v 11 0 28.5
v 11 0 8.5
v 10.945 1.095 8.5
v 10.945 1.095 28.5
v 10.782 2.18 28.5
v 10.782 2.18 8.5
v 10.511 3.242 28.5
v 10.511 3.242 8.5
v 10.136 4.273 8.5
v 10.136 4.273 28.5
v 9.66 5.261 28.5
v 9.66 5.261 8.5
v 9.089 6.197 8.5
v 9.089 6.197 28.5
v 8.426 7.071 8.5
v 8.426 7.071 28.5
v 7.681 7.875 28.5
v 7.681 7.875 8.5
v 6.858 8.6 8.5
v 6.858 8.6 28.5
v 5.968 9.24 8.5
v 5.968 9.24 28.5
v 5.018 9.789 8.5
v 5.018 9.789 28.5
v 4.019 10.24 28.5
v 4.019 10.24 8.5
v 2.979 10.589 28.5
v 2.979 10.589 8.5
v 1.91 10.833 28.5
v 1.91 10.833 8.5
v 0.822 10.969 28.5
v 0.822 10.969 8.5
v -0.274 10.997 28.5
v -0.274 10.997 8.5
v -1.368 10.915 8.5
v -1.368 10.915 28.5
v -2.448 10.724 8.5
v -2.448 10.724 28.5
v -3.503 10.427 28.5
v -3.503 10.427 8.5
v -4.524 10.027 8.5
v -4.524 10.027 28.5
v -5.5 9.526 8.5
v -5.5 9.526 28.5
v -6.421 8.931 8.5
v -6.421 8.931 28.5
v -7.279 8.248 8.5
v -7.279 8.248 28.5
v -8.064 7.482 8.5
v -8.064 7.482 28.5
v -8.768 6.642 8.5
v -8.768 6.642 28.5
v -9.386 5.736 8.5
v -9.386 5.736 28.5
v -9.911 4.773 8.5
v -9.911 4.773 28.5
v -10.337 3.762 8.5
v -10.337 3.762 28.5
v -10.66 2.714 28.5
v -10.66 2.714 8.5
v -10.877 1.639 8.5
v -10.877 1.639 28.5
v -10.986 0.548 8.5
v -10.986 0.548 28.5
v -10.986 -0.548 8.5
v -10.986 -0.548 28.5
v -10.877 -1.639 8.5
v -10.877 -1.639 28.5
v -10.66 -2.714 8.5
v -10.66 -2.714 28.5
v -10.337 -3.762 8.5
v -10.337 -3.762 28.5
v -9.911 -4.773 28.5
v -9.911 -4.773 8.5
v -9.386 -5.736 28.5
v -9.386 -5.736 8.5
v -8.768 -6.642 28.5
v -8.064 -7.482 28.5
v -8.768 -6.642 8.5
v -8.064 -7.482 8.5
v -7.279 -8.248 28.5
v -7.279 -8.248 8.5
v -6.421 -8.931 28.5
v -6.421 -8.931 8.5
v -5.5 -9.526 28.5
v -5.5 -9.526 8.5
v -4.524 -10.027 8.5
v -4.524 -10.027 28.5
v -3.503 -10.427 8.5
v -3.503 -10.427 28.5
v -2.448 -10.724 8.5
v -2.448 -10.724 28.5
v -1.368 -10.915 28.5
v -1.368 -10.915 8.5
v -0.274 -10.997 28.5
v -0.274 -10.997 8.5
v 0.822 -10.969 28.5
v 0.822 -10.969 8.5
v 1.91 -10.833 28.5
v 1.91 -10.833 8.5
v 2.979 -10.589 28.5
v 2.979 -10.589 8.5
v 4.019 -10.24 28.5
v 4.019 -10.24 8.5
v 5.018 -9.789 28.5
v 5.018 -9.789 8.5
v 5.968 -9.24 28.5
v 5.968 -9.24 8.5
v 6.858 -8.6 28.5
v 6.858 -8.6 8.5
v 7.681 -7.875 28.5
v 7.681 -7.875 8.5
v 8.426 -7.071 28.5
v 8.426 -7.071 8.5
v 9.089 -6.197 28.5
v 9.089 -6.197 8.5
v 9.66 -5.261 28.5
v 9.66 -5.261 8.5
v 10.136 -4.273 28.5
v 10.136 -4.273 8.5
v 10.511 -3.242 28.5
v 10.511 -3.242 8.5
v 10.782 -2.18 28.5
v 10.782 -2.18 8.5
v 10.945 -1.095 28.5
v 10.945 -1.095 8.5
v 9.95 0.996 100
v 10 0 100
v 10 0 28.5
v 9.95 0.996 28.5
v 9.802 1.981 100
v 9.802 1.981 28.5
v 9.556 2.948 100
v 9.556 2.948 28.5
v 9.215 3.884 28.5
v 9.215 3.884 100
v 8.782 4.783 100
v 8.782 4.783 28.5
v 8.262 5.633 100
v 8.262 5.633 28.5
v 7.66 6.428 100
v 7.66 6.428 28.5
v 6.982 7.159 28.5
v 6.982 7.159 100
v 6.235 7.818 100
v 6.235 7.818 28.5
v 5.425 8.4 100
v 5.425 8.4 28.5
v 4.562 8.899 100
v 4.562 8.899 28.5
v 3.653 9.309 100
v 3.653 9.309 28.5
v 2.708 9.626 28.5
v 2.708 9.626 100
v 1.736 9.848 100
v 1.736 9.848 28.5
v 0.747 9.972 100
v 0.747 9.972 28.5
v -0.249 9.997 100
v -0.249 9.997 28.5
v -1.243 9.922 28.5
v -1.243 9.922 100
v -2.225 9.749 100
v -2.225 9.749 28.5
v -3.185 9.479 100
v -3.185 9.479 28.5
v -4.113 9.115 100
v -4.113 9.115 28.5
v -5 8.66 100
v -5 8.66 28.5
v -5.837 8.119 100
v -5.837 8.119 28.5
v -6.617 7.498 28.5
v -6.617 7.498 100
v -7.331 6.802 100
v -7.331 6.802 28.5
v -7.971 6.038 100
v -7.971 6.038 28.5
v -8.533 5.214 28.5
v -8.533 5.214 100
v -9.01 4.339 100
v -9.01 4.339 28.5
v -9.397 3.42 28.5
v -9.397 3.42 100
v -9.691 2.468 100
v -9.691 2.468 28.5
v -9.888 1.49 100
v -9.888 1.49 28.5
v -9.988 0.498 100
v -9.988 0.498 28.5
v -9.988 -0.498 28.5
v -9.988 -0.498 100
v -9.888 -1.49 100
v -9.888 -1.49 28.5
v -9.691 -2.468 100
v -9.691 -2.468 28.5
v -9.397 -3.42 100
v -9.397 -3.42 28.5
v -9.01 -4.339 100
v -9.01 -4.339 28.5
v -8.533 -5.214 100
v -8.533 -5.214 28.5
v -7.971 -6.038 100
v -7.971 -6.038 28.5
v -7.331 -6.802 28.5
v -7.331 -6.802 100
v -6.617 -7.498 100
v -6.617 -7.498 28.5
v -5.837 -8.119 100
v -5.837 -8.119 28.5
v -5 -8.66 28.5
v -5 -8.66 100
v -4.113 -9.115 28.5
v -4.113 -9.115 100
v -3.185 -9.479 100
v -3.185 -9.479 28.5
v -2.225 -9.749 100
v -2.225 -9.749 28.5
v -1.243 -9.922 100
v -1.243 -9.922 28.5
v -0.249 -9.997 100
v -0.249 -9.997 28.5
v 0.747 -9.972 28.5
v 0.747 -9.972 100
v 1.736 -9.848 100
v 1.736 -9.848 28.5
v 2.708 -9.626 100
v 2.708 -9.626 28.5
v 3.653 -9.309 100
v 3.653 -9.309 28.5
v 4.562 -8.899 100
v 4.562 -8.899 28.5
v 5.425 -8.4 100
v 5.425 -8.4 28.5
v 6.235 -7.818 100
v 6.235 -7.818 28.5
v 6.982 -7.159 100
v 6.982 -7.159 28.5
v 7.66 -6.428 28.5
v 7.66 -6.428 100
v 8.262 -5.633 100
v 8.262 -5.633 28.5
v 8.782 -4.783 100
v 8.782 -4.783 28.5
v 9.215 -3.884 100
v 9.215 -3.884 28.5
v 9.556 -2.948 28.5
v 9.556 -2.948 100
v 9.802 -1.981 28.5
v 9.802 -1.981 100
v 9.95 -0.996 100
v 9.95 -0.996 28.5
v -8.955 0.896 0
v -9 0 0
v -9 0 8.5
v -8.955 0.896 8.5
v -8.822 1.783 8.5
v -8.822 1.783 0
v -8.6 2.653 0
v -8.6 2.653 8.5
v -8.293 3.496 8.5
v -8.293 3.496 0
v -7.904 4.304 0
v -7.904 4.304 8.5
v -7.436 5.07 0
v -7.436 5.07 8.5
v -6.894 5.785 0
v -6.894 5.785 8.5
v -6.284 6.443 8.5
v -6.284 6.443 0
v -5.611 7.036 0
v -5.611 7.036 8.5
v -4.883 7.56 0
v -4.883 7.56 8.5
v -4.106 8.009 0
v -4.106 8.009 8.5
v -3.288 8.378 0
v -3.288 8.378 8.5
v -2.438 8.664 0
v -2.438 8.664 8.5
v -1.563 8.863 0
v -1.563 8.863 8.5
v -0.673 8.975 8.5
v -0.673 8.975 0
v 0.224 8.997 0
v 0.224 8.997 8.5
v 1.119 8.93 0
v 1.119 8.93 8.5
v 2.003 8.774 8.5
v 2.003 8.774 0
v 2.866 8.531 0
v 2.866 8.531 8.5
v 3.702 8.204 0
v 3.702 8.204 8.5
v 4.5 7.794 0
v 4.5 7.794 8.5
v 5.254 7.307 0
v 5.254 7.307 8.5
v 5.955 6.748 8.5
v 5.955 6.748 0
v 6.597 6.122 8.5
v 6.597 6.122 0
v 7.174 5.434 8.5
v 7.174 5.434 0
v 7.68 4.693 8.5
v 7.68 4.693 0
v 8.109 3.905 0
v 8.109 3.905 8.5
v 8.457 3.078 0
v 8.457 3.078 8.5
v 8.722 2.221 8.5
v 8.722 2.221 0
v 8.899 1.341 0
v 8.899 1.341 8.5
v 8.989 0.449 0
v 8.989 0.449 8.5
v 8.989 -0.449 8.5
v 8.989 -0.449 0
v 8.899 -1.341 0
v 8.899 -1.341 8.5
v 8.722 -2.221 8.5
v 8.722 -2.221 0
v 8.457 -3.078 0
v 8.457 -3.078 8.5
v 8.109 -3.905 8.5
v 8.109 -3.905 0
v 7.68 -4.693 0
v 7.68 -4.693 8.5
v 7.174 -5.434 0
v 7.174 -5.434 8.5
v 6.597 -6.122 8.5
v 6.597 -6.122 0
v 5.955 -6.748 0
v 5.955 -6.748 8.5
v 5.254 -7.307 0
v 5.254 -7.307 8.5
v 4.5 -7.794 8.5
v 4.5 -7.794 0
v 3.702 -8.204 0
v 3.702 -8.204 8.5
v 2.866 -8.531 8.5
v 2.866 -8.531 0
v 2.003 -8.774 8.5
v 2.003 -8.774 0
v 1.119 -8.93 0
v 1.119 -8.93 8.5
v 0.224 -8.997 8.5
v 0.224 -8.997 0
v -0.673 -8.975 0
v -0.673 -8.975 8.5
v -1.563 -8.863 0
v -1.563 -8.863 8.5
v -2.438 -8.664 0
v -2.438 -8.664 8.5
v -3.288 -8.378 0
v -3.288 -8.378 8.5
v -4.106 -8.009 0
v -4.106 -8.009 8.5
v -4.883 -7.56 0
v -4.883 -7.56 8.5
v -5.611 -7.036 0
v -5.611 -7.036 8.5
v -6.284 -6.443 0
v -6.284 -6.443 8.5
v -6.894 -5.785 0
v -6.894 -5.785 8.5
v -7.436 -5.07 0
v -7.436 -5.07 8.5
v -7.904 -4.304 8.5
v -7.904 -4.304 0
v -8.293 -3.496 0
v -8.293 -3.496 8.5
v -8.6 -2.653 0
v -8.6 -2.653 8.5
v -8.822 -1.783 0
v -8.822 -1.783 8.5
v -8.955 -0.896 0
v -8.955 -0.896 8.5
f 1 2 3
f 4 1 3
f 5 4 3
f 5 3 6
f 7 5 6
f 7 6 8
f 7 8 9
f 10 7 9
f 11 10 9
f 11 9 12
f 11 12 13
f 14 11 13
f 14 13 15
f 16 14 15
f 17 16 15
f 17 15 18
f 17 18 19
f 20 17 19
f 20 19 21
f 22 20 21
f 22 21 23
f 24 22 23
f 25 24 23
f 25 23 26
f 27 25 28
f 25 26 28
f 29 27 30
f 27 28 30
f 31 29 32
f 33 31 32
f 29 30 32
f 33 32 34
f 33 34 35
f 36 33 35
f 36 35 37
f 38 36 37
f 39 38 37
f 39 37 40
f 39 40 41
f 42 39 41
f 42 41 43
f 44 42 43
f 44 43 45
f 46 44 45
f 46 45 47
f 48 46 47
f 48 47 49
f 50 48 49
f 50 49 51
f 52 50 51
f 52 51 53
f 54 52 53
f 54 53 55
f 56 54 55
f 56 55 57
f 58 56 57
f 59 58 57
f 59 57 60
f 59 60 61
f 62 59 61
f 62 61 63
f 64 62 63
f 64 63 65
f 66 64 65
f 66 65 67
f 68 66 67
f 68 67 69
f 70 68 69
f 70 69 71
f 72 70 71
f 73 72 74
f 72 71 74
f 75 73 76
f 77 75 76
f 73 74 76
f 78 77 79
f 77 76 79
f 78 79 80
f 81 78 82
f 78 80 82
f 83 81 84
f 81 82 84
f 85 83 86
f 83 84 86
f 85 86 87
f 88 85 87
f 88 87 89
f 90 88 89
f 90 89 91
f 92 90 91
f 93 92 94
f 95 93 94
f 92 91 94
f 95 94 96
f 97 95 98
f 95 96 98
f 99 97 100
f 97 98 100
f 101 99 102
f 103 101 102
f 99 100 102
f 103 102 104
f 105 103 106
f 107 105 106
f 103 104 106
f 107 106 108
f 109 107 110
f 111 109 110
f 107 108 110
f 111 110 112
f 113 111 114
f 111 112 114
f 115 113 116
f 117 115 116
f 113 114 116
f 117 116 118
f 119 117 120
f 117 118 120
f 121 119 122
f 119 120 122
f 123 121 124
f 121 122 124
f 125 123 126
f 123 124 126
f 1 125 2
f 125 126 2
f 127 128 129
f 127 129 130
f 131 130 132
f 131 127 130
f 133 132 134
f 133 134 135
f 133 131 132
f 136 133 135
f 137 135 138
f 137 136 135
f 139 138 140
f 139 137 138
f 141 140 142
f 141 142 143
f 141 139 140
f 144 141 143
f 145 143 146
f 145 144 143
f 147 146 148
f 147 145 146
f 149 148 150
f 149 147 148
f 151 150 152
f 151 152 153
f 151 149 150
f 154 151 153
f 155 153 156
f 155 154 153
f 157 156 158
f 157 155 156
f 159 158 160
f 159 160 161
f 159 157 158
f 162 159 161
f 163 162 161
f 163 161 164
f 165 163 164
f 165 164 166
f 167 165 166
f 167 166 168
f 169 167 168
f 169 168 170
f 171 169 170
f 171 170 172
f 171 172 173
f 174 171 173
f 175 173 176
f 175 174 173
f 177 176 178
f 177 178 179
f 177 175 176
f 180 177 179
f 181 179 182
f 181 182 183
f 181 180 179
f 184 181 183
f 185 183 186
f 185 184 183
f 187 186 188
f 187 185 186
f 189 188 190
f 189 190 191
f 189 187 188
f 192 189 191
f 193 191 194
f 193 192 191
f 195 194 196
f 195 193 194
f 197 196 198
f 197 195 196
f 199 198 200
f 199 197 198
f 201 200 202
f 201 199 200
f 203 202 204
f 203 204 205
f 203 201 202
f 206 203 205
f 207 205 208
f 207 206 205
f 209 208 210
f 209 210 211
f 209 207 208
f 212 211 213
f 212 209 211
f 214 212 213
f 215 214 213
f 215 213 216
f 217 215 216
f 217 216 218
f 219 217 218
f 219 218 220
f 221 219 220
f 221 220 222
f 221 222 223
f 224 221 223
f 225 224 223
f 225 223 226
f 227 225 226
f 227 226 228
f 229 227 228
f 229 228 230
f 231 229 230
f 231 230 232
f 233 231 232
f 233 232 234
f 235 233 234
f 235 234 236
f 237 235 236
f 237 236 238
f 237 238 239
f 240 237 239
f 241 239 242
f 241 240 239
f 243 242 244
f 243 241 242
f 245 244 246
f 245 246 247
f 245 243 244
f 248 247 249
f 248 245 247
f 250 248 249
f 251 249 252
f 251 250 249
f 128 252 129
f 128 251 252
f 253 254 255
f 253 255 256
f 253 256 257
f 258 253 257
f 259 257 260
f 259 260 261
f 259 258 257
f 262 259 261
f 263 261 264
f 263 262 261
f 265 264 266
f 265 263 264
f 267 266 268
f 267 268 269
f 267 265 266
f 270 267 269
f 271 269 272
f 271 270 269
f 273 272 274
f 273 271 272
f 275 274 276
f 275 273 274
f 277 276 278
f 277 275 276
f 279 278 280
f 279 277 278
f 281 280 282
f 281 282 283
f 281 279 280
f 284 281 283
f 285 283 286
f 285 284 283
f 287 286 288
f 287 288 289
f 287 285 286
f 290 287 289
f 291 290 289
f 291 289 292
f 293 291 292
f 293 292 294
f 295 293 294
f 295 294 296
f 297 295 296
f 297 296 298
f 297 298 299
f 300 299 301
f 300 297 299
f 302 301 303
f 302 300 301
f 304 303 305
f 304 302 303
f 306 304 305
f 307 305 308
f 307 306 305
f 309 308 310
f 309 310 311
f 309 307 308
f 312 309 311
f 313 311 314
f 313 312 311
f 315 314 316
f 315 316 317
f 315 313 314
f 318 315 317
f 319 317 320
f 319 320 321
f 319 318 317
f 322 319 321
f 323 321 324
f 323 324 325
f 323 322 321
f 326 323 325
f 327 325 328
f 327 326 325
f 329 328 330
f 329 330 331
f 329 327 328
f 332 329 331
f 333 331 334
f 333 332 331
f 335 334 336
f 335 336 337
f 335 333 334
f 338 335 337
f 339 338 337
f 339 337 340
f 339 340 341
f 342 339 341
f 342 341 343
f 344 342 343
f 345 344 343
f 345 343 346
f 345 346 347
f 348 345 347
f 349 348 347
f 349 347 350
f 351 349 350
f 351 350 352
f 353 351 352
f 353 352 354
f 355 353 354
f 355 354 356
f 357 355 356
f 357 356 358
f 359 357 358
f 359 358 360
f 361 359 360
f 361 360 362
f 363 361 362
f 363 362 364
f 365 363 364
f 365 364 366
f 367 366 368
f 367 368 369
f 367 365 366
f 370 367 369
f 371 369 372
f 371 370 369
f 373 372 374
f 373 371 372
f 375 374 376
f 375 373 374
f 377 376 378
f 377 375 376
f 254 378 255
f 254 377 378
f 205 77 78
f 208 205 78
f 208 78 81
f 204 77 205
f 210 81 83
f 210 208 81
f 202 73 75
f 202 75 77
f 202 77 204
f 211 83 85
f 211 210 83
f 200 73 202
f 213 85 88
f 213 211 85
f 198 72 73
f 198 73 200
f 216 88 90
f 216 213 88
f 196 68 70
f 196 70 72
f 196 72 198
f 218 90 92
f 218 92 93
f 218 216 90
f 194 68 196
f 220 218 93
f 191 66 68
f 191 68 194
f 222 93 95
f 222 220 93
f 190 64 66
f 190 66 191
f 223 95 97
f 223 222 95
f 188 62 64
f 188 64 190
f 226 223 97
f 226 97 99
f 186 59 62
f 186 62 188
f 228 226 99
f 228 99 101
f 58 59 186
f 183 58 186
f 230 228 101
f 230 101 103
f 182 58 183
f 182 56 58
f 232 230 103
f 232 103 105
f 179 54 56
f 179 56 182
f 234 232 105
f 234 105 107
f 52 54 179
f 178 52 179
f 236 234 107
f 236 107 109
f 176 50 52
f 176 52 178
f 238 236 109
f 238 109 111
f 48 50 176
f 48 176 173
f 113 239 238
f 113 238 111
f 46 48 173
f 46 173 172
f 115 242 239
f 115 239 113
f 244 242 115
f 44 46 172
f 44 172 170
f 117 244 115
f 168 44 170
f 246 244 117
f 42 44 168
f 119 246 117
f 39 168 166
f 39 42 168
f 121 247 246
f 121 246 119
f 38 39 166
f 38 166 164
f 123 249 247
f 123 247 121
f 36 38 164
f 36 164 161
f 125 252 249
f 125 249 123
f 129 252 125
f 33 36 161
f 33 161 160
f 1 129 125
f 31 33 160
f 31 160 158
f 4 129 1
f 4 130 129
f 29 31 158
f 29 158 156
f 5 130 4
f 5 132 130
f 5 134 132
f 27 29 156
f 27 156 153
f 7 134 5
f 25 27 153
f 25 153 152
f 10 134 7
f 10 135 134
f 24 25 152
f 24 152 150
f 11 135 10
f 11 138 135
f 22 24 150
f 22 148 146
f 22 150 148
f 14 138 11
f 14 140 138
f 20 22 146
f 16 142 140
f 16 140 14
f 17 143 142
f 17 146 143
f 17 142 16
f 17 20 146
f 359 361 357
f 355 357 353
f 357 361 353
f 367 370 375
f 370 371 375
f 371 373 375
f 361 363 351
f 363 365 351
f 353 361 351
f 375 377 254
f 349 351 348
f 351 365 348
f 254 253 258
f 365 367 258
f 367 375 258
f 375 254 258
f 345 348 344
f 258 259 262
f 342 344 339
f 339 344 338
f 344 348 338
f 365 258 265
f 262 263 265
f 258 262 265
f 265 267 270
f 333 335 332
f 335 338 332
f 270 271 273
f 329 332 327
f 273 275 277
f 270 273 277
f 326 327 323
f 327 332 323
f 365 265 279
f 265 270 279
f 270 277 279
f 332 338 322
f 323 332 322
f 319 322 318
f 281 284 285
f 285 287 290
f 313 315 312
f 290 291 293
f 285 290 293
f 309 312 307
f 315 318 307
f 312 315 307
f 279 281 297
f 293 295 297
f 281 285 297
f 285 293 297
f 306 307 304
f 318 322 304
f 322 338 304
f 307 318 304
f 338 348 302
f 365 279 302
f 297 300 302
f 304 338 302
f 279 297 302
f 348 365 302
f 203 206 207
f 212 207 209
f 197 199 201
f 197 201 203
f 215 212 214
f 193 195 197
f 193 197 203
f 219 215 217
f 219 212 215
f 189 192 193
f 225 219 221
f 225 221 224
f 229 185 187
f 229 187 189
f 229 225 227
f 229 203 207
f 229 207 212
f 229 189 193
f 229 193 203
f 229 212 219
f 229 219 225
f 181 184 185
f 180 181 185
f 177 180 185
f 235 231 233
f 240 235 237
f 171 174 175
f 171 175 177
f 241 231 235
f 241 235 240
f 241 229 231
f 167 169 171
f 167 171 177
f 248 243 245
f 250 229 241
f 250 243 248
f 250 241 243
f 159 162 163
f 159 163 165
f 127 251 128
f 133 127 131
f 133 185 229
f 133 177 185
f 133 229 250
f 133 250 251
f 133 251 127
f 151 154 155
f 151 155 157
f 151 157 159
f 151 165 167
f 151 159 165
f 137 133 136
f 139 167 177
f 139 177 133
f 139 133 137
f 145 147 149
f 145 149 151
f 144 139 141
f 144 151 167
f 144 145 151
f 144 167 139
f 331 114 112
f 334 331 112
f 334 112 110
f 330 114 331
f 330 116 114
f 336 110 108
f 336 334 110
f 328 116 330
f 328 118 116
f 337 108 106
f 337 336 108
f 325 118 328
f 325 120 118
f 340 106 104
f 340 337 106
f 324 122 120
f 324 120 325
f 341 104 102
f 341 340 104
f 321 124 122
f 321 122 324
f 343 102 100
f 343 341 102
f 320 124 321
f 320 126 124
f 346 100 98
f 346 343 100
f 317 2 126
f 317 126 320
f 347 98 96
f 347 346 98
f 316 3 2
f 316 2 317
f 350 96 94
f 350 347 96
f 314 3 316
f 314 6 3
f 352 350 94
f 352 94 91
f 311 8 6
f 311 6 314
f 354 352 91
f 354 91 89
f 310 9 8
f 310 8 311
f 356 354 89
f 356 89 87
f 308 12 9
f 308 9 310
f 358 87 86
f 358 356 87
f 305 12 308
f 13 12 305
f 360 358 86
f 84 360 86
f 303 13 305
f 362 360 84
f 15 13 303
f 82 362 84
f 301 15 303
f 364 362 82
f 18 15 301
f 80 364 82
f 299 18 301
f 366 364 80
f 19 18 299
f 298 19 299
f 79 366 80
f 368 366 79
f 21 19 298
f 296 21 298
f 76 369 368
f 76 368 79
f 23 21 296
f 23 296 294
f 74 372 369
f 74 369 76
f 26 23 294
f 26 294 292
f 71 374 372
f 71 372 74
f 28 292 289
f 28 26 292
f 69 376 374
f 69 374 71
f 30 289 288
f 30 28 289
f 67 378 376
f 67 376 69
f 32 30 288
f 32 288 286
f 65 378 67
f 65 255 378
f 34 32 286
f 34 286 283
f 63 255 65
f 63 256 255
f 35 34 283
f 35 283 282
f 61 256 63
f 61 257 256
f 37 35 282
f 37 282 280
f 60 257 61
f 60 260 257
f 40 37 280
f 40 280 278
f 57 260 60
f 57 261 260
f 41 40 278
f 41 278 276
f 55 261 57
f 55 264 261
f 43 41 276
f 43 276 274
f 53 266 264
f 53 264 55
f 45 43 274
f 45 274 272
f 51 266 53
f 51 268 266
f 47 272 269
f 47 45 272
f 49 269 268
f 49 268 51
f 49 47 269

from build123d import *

# Parameters (mm, degrees)
SKETCH_1_R          = 11
EXTRUDE_1_DEPTH     = 100
SKETCH_2_R          = 11
SKETCH_2_R_2        = 9
CUT_EXTRUDE_1_DEPTH = 8.5
SKETCH_3_R          = 11
SKETCH_3_R_2        = 10
CUT_EXTRUDE_2_DEPTH = 71.5


with BuildPart() as part:
    # 草圖1 → 填料-伸長1 (new body)
    with BuildSketch(Plane.XY):
        Circle(SKETCH_1_R)
    extrude(amount=EXTRUDE_1_DEPTH)

    # 草圖2 → 除料-伸長1 (cut)
    with BuildSketch(Plane(origin=(0, 0, 0), x_dir=(-1, 0, 0), z_dir=(0, 0, -1))):
        Circle(SKETCH_2_R)
        Circle(SKETCH_2_R_2, mode=Mode.SUBTRACT)
    extrude(amount=-CUT_EXTRUDE_1_DEPTH, mode=Mode.SUBTRACT)

    # 草圖3 → 除料-伸長2 (cut)
    with BuildSketch(Plane.XY.offset(100)):
        Circle(SKETCH_3_R)
        Circle(SKETCH_3_R_2, mode=Mode.SUBTRACT)
    extrude(amount=-CUT_EXTRUDE_2_DEPTH, mode=Mode.SUBTRACT)


solid = part.part
